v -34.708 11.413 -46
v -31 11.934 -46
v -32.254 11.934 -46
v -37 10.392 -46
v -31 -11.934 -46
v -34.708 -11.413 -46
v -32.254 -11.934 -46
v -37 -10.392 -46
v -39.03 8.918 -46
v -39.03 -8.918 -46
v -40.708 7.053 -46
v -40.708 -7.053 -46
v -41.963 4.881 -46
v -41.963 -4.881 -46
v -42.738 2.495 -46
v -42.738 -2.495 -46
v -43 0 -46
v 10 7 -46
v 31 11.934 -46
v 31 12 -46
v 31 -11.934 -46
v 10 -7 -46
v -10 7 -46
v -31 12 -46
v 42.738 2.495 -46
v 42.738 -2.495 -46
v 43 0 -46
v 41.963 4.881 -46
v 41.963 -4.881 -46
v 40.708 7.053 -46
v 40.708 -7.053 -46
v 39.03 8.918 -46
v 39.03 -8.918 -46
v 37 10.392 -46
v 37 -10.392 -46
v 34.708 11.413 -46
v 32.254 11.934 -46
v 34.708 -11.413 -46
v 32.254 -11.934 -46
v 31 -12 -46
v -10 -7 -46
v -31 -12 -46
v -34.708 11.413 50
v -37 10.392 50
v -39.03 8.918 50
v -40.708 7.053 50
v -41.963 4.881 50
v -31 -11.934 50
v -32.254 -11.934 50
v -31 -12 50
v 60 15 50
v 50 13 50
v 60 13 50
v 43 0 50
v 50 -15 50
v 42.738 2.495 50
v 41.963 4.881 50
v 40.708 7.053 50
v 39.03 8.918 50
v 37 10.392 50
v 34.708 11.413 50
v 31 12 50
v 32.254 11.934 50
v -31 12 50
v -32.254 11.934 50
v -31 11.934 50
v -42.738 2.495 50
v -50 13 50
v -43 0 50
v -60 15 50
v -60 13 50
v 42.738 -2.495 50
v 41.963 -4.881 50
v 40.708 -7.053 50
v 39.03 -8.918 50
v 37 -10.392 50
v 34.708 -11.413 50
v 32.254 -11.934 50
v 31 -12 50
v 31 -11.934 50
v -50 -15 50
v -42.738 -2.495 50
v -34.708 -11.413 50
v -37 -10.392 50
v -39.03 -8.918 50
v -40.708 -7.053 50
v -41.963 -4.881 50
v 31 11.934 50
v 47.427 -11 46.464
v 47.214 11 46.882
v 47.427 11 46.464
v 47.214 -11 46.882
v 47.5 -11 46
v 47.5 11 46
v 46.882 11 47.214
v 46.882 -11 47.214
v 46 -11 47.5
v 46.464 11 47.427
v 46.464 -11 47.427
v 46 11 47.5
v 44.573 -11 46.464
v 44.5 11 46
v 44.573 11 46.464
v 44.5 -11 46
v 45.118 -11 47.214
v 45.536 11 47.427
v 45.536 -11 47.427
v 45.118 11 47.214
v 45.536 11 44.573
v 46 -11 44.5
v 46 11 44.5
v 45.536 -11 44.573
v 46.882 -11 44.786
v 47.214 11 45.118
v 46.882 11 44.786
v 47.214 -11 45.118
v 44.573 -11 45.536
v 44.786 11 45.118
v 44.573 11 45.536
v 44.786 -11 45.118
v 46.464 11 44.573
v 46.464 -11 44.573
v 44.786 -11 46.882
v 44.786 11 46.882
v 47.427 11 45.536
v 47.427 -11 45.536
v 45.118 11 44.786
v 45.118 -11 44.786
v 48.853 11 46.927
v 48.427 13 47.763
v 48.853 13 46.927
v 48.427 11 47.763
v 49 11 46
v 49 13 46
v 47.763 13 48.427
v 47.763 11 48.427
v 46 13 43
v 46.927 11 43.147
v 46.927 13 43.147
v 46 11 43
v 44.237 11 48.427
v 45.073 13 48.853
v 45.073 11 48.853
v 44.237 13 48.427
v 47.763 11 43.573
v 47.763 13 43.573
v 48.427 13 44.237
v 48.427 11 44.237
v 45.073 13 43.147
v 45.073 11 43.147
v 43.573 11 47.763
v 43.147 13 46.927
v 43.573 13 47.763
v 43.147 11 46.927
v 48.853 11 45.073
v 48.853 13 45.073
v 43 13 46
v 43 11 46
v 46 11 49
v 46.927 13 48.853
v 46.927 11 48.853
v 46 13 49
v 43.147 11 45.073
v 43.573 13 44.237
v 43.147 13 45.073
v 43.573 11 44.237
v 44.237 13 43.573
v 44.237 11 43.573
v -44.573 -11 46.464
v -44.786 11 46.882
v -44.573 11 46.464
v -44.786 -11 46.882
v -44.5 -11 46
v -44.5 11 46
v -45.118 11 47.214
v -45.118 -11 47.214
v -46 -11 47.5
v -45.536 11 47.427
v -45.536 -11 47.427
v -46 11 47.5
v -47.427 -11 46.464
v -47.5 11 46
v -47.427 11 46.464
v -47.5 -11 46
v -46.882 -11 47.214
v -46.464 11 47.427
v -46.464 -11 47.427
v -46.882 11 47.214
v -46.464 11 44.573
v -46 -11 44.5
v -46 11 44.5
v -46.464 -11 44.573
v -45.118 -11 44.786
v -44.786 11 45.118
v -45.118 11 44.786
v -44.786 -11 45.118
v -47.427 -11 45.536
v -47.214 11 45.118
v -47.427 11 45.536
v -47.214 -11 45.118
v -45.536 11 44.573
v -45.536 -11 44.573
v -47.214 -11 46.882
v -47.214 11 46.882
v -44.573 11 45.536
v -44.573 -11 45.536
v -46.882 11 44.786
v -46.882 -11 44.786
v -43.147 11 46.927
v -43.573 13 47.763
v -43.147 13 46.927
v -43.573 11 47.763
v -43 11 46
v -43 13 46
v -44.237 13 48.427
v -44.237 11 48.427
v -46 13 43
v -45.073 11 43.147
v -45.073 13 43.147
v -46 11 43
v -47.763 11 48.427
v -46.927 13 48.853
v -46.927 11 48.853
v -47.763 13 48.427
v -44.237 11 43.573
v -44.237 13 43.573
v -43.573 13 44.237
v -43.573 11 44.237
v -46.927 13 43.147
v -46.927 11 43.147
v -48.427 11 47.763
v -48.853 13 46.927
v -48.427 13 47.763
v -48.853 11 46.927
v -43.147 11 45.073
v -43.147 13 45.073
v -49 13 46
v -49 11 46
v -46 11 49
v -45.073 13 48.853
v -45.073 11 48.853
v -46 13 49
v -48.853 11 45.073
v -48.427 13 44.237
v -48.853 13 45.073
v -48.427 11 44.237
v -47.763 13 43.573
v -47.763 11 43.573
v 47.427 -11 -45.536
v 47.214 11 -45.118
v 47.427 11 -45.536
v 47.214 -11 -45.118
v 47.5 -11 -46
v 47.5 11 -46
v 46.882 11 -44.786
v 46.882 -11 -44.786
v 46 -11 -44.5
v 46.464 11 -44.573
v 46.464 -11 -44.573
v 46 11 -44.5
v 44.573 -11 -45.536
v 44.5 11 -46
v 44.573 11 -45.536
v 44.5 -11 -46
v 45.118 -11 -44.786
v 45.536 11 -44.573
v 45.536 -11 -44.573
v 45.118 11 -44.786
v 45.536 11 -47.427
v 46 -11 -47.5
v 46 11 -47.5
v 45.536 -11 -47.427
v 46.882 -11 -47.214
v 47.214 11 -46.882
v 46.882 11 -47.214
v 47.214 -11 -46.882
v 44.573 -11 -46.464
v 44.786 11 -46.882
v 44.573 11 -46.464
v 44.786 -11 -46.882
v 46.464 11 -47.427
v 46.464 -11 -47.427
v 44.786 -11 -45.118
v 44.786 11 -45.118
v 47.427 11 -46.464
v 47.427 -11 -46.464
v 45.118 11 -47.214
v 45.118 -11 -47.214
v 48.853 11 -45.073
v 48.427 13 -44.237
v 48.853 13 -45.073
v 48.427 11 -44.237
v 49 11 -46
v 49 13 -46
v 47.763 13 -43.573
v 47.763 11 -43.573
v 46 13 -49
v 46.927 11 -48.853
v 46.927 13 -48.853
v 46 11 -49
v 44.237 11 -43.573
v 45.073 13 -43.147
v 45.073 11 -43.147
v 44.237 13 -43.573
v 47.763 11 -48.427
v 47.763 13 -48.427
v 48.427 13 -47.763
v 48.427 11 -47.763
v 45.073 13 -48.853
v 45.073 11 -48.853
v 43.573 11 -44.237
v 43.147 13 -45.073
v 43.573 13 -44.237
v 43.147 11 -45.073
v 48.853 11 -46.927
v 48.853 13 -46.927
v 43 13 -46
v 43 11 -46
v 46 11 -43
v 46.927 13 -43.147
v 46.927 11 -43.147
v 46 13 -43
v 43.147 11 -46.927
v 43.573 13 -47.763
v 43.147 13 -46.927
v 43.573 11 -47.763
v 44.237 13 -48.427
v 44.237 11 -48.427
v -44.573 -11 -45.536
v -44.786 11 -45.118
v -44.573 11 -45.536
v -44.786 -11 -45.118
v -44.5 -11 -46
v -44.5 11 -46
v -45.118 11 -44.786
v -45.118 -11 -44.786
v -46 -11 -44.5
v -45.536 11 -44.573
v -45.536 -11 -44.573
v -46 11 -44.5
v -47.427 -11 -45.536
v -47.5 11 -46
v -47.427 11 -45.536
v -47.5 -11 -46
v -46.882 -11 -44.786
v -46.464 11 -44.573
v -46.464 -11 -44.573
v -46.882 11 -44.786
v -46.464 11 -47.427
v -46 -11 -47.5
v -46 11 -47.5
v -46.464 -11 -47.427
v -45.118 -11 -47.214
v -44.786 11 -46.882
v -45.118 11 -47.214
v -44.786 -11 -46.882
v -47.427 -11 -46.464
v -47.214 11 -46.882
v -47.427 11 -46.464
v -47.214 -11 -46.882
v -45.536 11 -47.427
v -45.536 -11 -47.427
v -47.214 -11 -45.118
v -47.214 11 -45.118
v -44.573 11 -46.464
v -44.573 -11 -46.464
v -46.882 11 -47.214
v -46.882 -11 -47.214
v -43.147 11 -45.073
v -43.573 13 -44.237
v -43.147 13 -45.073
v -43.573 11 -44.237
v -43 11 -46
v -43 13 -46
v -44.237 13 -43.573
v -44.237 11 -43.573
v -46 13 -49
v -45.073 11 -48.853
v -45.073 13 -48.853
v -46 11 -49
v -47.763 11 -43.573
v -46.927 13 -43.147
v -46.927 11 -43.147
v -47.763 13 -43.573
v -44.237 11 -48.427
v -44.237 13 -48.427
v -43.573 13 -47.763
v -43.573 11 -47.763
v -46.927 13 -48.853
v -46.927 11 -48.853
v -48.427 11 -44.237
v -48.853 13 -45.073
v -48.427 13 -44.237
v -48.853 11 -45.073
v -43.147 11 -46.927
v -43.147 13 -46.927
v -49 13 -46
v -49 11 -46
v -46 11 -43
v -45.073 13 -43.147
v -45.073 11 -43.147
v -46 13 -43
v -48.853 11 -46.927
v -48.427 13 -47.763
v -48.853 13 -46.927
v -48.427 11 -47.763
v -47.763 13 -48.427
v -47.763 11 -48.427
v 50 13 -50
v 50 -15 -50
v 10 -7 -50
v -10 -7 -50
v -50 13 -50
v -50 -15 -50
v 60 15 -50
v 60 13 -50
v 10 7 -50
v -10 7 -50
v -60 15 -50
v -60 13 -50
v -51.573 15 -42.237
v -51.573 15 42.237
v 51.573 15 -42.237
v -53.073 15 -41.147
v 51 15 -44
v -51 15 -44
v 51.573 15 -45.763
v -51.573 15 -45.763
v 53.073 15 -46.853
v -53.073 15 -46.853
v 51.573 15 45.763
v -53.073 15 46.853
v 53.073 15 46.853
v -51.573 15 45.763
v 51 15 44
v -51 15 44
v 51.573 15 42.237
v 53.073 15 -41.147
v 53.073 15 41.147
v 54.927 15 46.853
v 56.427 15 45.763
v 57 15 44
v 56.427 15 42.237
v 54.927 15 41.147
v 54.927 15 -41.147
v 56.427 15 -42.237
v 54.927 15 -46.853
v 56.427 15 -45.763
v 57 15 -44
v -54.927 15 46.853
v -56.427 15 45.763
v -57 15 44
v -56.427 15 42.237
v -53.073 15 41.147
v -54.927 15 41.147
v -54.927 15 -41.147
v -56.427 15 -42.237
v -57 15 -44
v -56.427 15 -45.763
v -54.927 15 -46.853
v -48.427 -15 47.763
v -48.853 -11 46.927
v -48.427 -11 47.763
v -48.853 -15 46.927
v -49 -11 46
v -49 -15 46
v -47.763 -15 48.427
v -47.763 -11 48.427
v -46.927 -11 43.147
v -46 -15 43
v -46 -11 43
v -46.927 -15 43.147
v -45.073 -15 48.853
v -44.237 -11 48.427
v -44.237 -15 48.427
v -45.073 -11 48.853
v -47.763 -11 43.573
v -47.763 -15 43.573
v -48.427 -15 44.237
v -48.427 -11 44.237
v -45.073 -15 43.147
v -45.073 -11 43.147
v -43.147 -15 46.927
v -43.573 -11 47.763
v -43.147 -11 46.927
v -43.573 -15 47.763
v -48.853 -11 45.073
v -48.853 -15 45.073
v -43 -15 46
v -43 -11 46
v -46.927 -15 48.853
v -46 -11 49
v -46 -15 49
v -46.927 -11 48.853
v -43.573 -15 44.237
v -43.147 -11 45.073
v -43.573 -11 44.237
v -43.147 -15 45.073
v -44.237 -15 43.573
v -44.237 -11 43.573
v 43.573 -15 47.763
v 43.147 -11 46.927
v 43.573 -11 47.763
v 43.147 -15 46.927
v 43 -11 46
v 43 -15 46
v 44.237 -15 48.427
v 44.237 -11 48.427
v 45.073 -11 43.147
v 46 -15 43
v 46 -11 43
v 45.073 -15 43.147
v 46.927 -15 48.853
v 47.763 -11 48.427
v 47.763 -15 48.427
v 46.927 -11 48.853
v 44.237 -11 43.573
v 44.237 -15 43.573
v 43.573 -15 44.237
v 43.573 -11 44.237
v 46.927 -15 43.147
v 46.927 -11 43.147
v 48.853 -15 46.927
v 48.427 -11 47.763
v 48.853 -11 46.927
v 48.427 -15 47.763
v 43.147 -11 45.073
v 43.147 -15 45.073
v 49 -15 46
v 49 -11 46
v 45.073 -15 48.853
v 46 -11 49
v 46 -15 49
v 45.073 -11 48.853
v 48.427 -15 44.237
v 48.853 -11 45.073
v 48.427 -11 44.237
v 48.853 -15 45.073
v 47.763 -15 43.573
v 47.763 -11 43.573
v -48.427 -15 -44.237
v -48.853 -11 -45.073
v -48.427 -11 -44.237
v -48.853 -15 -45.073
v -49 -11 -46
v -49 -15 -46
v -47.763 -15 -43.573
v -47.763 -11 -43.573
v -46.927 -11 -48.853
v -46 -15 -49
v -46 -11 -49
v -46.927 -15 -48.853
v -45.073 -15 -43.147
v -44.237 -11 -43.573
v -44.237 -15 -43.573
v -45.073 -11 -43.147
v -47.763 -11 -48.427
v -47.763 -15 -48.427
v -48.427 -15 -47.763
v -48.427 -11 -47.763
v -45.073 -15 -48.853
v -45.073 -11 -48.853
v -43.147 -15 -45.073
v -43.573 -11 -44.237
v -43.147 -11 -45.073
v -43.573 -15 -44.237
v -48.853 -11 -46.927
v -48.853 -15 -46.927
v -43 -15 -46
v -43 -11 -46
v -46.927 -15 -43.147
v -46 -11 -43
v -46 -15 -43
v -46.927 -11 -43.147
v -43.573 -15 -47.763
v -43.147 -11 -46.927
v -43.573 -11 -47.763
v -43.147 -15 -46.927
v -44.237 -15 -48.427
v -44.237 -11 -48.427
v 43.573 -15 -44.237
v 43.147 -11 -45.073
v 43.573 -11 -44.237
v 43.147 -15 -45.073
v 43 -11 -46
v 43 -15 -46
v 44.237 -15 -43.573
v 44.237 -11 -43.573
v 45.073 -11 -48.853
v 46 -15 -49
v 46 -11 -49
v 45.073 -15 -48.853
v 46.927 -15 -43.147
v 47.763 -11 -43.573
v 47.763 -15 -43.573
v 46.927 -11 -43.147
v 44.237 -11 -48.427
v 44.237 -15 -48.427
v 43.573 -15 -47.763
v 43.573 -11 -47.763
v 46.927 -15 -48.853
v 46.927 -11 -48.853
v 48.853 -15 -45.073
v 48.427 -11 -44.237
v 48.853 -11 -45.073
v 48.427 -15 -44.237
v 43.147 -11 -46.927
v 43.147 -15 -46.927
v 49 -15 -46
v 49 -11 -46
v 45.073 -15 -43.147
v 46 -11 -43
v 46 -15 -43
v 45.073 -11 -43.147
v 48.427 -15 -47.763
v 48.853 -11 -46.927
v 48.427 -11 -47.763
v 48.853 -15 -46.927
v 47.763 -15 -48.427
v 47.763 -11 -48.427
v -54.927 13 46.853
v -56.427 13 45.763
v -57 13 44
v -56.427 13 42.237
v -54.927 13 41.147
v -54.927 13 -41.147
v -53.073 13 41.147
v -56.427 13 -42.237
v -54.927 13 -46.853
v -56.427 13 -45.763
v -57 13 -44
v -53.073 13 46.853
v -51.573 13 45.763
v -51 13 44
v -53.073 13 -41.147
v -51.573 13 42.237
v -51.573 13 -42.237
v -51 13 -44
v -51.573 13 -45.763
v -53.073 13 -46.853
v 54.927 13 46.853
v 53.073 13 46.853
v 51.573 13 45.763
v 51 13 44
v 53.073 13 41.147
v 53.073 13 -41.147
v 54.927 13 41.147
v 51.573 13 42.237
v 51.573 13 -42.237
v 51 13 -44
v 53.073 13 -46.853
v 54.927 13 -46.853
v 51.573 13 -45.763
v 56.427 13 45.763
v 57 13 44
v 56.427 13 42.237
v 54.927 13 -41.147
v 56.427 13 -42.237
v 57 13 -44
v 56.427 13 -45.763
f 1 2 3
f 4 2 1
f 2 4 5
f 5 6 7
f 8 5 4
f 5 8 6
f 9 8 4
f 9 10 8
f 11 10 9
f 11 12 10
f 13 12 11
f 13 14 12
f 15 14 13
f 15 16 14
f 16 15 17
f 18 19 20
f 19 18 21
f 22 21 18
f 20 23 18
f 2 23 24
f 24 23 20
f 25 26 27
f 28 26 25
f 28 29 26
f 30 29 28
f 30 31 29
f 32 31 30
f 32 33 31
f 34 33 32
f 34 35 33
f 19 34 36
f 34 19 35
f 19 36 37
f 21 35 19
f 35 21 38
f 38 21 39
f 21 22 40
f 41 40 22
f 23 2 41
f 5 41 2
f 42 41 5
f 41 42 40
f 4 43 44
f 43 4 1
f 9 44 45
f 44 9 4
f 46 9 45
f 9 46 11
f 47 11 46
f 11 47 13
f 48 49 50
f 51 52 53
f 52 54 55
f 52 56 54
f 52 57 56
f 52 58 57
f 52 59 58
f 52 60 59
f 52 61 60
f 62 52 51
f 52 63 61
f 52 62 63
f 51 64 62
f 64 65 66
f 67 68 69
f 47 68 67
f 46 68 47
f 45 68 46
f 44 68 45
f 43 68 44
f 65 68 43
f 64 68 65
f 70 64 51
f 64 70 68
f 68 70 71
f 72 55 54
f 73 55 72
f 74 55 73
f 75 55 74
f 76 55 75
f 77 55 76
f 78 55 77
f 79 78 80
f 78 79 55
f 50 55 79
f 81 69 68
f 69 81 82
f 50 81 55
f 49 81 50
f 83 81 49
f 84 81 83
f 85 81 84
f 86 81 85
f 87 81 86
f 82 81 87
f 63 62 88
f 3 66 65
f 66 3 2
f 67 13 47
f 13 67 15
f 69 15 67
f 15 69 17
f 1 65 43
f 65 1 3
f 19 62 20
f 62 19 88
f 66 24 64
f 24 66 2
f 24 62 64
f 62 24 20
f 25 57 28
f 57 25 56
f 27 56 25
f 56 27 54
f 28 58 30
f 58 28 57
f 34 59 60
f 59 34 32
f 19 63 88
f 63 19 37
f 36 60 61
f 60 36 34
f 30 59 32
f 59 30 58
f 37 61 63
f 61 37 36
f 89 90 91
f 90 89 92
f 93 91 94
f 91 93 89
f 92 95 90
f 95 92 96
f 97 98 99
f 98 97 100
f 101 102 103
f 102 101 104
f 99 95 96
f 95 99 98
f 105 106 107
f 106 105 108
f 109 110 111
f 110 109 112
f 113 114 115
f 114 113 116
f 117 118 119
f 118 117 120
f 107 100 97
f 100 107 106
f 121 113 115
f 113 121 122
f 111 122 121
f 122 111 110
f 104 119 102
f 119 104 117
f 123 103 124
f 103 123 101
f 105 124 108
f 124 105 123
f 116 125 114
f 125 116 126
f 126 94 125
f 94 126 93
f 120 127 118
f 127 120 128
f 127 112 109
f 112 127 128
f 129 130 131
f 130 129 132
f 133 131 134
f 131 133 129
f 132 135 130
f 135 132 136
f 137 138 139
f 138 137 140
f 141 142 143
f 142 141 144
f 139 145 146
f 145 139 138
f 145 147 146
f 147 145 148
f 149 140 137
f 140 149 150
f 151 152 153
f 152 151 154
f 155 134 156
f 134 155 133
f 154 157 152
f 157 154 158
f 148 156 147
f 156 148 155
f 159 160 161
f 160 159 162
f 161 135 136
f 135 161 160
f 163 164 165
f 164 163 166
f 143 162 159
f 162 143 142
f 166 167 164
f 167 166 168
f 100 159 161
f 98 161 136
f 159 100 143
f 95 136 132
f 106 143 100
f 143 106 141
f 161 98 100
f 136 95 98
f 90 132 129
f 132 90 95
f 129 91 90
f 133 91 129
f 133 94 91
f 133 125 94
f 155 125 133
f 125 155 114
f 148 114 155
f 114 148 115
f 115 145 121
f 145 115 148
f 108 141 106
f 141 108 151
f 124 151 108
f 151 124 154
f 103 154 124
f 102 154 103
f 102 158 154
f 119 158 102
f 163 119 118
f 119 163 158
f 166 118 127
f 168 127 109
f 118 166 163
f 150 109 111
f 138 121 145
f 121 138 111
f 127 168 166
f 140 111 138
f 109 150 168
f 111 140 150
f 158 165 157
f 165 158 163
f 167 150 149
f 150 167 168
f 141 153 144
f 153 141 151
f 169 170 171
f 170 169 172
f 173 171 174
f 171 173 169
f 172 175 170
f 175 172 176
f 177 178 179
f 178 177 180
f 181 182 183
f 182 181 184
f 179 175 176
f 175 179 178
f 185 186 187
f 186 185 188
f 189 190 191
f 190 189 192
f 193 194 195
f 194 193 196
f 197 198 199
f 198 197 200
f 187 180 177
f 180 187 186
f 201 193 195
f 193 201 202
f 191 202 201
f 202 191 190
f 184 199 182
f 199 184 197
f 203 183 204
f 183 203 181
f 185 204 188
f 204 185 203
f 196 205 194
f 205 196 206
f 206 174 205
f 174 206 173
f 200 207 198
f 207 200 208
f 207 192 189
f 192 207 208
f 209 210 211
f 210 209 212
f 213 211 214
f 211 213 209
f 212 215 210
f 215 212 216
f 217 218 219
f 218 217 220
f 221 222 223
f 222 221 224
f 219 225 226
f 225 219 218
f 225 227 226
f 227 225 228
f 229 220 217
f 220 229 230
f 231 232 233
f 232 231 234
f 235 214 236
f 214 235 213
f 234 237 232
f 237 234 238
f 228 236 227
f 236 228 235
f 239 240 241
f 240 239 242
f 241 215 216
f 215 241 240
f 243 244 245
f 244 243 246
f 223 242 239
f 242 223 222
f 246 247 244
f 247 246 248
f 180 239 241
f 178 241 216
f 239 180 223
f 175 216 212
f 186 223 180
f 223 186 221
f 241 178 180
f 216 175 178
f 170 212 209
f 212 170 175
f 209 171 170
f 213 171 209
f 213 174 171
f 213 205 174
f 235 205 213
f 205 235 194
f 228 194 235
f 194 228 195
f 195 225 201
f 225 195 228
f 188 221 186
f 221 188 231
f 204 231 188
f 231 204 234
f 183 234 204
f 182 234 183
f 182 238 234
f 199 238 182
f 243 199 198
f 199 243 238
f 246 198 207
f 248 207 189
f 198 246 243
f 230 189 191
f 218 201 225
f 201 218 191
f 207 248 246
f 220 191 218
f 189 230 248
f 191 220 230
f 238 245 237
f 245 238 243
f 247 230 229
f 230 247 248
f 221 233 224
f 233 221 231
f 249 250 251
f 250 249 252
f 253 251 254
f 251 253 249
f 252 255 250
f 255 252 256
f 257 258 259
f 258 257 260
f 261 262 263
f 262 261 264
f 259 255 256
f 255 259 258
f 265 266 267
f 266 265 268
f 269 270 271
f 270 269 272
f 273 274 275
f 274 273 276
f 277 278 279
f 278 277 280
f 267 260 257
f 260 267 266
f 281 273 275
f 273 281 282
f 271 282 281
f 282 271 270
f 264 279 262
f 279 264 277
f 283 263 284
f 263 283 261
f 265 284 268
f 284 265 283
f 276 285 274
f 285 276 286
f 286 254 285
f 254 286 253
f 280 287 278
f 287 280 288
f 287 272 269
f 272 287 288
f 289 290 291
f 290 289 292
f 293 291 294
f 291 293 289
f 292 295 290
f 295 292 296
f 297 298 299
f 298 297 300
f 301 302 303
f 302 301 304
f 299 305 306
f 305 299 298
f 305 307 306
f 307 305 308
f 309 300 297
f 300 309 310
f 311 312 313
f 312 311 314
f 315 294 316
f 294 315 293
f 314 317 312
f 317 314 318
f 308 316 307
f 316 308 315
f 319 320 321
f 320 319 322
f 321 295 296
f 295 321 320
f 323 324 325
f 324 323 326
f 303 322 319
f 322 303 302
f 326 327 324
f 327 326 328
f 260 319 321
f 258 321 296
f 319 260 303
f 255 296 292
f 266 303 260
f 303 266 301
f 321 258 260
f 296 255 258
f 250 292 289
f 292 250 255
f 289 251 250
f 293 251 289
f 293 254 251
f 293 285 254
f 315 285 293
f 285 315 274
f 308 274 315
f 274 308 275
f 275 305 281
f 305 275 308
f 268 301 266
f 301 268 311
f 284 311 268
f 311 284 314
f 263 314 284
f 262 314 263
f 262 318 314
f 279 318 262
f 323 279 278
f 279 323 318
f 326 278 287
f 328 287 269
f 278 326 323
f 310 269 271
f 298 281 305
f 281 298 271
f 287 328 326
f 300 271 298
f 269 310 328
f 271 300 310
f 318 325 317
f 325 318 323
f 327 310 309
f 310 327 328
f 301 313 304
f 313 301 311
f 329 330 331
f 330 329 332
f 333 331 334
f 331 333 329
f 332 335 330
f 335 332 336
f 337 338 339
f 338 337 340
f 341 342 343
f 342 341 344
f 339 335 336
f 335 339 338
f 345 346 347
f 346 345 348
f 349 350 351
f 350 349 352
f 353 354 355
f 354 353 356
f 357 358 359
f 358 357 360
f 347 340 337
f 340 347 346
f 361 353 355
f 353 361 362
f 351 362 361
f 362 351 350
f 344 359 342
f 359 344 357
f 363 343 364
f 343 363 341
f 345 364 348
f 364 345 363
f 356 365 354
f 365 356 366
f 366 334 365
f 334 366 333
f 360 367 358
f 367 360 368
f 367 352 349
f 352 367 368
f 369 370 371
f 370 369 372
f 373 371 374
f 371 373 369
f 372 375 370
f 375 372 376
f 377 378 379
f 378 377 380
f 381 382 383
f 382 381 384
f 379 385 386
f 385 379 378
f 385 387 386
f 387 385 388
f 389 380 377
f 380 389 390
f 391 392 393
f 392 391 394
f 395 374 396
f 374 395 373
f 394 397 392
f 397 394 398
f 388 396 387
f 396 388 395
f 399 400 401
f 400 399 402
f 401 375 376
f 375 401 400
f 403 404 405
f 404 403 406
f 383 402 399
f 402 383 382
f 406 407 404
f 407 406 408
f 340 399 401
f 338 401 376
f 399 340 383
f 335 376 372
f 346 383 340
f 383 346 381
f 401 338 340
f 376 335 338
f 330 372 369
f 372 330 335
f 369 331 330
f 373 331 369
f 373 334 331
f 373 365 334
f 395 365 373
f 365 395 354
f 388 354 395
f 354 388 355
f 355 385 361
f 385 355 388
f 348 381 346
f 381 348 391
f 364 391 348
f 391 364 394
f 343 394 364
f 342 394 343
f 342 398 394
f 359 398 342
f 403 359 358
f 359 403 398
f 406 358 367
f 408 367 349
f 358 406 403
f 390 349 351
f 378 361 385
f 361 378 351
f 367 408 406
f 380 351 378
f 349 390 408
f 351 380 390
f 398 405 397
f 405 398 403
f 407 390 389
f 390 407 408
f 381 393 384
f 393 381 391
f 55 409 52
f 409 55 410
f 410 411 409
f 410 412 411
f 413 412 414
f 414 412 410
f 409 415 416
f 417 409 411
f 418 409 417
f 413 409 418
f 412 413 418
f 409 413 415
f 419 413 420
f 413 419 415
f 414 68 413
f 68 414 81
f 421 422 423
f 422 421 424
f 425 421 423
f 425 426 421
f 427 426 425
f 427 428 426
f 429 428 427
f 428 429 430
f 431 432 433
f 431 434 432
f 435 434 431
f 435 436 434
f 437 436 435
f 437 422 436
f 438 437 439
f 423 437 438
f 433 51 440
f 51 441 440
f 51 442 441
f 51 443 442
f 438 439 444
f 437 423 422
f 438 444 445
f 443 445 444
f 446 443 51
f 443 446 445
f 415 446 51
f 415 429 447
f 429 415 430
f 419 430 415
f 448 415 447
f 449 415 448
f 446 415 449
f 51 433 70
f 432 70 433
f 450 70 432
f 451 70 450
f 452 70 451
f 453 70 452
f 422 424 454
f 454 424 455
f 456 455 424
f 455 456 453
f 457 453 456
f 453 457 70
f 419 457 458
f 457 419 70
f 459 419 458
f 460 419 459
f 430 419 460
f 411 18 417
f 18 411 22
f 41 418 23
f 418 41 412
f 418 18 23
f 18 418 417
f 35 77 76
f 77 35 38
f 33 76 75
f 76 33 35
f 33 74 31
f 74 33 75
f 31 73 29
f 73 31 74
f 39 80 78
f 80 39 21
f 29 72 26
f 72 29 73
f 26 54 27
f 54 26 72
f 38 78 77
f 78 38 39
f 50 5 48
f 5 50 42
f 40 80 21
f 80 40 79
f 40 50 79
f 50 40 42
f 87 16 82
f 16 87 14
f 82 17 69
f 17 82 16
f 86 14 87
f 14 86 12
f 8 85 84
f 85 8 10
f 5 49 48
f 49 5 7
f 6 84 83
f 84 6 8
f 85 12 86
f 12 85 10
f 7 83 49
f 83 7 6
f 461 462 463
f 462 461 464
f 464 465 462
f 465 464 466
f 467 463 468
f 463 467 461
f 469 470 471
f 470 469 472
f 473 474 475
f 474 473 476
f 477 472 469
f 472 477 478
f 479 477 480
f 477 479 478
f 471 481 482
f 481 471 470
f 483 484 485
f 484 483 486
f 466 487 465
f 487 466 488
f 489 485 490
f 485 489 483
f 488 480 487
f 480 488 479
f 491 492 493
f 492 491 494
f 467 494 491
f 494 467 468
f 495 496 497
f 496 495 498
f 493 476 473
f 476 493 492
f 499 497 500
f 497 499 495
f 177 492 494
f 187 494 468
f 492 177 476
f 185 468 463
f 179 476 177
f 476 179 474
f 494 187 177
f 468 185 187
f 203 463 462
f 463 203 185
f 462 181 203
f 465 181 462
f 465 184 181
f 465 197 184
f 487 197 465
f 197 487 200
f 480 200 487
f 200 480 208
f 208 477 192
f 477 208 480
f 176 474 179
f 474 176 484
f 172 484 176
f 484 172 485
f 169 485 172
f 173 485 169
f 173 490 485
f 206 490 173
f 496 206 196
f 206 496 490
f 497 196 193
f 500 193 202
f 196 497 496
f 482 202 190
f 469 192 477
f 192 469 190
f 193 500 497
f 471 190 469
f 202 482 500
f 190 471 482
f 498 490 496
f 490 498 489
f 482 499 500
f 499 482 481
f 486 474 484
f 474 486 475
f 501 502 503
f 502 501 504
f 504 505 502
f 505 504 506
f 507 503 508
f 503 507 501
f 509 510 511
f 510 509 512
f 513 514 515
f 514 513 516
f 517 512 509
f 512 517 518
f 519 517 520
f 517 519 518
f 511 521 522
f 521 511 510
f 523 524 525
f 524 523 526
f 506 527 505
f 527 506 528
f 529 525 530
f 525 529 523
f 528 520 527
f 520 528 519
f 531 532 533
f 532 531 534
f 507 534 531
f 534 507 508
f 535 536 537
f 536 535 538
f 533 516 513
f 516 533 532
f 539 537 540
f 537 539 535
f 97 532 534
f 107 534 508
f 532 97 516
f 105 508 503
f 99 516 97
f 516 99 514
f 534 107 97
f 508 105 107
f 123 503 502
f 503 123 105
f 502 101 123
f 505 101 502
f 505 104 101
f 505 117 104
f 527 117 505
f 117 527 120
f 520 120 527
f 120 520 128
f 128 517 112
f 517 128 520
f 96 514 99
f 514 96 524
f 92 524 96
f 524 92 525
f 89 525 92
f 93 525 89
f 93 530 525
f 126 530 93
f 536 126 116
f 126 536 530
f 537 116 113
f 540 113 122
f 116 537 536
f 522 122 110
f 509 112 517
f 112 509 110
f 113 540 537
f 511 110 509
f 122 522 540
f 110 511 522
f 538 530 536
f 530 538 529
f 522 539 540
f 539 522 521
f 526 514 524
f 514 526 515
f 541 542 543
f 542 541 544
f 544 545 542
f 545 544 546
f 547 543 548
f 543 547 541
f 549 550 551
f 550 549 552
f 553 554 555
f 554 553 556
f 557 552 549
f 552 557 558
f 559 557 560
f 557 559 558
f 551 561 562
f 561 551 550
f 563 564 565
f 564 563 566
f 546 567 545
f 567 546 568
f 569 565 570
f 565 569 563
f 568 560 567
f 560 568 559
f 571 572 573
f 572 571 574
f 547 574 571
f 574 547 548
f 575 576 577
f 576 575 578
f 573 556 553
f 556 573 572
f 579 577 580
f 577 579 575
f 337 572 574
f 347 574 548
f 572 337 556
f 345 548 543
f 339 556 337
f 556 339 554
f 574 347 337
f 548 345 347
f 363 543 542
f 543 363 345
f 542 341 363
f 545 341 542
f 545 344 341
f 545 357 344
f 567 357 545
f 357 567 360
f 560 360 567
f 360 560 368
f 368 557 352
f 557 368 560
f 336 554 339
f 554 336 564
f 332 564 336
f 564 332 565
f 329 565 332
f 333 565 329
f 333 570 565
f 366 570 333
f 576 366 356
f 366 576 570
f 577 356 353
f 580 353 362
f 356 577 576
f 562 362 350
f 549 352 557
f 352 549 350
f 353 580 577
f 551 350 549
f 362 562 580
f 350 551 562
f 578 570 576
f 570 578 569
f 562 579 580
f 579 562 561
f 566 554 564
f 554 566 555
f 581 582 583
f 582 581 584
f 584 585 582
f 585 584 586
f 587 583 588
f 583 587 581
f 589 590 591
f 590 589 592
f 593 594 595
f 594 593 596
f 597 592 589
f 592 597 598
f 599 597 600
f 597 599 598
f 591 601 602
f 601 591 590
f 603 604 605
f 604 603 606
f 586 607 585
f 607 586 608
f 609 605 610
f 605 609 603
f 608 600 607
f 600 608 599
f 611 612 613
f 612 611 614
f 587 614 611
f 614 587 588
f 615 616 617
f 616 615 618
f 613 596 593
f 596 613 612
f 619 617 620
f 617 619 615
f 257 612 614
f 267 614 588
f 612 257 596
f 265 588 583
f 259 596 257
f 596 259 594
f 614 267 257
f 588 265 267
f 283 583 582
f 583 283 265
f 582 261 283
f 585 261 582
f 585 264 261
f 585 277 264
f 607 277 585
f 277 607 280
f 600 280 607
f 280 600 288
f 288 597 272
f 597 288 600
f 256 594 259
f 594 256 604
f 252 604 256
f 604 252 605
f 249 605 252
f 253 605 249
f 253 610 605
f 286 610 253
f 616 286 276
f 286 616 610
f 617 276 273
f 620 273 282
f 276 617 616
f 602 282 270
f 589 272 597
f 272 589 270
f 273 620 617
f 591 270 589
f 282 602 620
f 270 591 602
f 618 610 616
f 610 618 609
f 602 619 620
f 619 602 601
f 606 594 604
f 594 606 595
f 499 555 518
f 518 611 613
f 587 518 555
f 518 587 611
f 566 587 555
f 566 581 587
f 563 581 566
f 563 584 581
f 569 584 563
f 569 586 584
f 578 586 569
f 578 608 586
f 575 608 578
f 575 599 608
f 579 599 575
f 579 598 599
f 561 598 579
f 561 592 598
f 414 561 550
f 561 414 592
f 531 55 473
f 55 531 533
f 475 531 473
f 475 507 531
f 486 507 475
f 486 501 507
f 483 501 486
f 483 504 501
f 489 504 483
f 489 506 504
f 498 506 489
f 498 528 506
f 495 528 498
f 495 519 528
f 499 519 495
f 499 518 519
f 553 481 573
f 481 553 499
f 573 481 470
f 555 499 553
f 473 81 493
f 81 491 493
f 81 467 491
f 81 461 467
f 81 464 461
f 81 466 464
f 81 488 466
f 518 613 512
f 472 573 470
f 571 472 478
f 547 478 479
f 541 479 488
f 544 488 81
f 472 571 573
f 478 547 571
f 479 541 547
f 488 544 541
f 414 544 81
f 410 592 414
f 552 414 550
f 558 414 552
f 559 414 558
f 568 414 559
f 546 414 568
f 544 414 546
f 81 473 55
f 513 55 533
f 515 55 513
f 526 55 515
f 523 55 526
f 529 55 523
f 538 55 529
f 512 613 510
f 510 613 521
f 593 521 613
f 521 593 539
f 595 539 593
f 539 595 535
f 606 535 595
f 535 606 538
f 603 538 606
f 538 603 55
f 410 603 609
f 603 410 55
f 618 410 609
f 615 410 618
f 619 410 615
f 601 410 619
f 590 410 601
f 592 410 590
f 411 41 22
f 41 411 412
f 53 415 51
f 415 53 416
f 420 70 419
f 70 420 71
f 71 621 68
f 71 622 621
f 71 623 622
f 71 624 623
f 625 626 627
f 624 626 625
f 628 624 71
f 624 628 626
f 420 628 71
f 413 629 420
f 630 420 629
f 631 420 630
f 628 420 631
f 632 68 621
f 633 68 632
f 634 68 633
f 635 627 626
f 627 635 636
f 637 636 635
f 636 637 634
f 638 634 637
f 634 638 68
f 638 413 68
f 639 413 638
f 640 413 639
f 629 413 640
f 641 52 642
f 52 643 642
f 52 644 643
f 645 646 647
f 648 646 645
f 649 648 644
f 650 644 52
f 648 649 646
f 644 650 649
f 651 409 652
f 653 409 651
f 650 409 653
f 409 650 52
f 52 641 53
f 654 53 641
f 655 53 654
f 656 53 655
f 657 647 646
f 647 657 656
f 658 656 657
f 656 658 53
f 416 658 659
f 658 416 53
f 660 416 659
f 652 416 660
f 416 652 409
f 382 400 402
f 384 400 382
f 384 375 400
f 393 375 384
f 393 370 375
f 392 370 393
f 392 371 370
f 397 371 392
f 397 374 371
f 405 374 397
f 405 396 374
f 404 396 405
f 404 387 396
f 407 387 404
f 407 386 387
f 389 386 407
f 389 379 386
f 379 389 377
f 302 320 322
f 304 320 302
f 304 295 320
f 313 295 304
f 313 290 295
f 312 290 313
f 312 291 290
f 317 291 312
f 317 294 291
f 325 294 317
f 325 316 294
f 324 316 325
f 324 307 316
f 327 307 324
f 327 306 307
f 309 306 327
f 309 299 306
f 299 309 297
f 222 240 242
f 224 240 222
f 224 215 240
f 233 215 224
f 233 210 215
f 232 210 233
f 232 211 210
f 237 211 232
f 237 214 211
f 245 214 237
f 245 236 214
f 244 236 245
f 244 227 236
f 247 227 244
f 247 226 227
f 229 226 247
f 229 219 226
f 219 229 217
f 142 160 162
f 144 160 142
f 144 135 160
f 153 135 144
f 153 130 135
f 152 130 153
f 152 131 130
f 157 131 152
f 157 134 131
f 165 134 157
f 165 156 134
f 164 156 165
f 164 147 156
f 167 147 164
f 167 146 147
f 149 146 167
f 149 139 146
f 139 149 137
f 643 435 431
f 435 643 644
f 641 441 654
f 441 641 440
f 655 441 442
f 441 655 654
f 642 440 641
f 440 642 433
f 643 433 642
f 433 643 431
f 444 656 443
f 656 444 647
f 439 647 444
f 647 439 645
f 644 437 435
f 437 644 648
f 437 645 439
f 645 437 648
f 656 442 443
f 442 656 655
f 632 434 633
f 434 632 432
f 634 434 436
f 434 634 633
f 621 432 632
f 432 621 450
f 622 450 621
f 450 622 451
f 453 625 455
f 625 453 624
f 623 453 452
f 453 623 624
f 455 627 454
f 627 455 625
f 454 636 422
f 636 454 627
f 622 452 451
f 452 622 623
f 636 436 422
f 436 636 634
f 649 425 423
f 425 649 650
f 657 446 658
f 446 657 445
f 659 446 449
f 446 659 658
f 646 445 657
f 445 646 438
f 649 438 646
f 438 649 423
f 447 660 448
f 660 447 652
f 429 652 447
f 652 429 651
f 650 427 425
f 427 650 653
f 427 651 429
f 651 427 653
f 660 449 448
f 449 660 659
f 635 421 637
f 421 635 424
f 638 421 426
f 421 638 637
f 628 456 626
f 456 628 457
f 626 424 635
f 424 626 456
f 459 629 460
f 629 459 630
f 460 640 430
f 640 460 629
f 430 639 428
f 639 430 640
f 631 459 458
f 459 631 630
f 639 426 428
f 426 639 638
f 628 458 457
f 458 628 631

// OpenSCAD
// USB-Netzteil-Halterung
// ======================

/*[ Dimension des USB-Box ]*/
usb_length = 86;
usb_width = 24;
usb_height = 96;


/*[ Dimension des Halter ]*/
halter_length = 100;
halter_width = 30;
halter_height = 100;

/*[ Druckoptionen ]*/

Oben = true;
Unten= true;

halter();

module usb_box() {
    translate([-(usb_length/2-usb_width/2),0,0])
    ecke();
    body();
    translate([usb_length/2-usb_width/2,0,0])
    ecke();  
}

module body() {

    cube([usb_length-usb_width,usb_width,usb_height], center=true);
}

module ecke() {
    cylinder(d=usb_width, h=usb_height, center=true);
}

module halter_teil() {
    difference() {
        translate([0,halter_width/4,0])
        cube([halter_length, halter_width/2,    halter_height], center=true);
        translate([0,0,(halter_height-usb_height)/2])
        #usb_box();
        
        // Verbindungsköcher
        translate([halter_length/2-4,0,halter_height/2-4])
        rotate([90,0,0])
        {
            cylinder(d=3, h=halter_width+6, center=true, $fn=20);
            translate([0,0,-halter_width/2])
            cylinder(d=6, h=8, center=true, $fn=20);
        }
        translate([-halter_length/2+4,0,halter_height/2-4])
        rotate([90,0,0])
        {
            cylinder(d=3, h=halter_width+6, center=true, $fn=20);
            translate([0,0,-halter_width/2])
            cylinder(d=6, h=8, center=true, $fn=20);
        }
        translate([halter_length/2-4,0,-halter_height/2+4])
        rotate([90,0,0])
        {
            cylinder(d=3, h=halter_width+6, center=true, $fn=20);
            translate([0,0,-halter_width/2])
            cylinder(d=6, h=8, center=true, $fn=20);
        }
        translate([-halter_length/2+4,0,-halter_height/2+4])
        rotate([90,0,0])
        {
            cylinder(d=3, h=halter_width+6, center=true, $fn=20);
            translate([0,0,-halter_width/2])
            cylinder(d=6, h=8, center=true, $fn=20);
        }
        
        // Netzanschluss
        translate([0,0,-halter_height/2])
        cube([20,14,20],center=true);
   }
}

module halter() {
    if (Oben) {
        rotate([0,0,180])
        halter_teil();
    }
   if (Unten) {
        halter_teil();
        translate([0,halter_width/2-1,0])
        boden();
   }
}

module boden() {
    difference() {
        cube([halter_length+20,2, halter_height],center=true);
        translate([(halter_length+20)/2 -6,0, halter_height/2 -6])
        rotate([90,0,0])
        cylinder(d=6, h=10, center=true);
        translate([(-halter_length-20)/2 +6,0, halter_height/2 -6])
        rotate([90,0,0])
        cylinder(d=6, h=10, center=true);
        translate([(halter_length+20)/2 -6,0, -halter_height/2 +6])
        rotate([90,0,0])
        cylinder(d=6, h=10, center=true);
        translate([(-halter_length-20)/2 +6,0, -halter_height/2 +6])
        rotate([90,0,0])
        cylinder(d=6, h=10, center=true);
    }
}
